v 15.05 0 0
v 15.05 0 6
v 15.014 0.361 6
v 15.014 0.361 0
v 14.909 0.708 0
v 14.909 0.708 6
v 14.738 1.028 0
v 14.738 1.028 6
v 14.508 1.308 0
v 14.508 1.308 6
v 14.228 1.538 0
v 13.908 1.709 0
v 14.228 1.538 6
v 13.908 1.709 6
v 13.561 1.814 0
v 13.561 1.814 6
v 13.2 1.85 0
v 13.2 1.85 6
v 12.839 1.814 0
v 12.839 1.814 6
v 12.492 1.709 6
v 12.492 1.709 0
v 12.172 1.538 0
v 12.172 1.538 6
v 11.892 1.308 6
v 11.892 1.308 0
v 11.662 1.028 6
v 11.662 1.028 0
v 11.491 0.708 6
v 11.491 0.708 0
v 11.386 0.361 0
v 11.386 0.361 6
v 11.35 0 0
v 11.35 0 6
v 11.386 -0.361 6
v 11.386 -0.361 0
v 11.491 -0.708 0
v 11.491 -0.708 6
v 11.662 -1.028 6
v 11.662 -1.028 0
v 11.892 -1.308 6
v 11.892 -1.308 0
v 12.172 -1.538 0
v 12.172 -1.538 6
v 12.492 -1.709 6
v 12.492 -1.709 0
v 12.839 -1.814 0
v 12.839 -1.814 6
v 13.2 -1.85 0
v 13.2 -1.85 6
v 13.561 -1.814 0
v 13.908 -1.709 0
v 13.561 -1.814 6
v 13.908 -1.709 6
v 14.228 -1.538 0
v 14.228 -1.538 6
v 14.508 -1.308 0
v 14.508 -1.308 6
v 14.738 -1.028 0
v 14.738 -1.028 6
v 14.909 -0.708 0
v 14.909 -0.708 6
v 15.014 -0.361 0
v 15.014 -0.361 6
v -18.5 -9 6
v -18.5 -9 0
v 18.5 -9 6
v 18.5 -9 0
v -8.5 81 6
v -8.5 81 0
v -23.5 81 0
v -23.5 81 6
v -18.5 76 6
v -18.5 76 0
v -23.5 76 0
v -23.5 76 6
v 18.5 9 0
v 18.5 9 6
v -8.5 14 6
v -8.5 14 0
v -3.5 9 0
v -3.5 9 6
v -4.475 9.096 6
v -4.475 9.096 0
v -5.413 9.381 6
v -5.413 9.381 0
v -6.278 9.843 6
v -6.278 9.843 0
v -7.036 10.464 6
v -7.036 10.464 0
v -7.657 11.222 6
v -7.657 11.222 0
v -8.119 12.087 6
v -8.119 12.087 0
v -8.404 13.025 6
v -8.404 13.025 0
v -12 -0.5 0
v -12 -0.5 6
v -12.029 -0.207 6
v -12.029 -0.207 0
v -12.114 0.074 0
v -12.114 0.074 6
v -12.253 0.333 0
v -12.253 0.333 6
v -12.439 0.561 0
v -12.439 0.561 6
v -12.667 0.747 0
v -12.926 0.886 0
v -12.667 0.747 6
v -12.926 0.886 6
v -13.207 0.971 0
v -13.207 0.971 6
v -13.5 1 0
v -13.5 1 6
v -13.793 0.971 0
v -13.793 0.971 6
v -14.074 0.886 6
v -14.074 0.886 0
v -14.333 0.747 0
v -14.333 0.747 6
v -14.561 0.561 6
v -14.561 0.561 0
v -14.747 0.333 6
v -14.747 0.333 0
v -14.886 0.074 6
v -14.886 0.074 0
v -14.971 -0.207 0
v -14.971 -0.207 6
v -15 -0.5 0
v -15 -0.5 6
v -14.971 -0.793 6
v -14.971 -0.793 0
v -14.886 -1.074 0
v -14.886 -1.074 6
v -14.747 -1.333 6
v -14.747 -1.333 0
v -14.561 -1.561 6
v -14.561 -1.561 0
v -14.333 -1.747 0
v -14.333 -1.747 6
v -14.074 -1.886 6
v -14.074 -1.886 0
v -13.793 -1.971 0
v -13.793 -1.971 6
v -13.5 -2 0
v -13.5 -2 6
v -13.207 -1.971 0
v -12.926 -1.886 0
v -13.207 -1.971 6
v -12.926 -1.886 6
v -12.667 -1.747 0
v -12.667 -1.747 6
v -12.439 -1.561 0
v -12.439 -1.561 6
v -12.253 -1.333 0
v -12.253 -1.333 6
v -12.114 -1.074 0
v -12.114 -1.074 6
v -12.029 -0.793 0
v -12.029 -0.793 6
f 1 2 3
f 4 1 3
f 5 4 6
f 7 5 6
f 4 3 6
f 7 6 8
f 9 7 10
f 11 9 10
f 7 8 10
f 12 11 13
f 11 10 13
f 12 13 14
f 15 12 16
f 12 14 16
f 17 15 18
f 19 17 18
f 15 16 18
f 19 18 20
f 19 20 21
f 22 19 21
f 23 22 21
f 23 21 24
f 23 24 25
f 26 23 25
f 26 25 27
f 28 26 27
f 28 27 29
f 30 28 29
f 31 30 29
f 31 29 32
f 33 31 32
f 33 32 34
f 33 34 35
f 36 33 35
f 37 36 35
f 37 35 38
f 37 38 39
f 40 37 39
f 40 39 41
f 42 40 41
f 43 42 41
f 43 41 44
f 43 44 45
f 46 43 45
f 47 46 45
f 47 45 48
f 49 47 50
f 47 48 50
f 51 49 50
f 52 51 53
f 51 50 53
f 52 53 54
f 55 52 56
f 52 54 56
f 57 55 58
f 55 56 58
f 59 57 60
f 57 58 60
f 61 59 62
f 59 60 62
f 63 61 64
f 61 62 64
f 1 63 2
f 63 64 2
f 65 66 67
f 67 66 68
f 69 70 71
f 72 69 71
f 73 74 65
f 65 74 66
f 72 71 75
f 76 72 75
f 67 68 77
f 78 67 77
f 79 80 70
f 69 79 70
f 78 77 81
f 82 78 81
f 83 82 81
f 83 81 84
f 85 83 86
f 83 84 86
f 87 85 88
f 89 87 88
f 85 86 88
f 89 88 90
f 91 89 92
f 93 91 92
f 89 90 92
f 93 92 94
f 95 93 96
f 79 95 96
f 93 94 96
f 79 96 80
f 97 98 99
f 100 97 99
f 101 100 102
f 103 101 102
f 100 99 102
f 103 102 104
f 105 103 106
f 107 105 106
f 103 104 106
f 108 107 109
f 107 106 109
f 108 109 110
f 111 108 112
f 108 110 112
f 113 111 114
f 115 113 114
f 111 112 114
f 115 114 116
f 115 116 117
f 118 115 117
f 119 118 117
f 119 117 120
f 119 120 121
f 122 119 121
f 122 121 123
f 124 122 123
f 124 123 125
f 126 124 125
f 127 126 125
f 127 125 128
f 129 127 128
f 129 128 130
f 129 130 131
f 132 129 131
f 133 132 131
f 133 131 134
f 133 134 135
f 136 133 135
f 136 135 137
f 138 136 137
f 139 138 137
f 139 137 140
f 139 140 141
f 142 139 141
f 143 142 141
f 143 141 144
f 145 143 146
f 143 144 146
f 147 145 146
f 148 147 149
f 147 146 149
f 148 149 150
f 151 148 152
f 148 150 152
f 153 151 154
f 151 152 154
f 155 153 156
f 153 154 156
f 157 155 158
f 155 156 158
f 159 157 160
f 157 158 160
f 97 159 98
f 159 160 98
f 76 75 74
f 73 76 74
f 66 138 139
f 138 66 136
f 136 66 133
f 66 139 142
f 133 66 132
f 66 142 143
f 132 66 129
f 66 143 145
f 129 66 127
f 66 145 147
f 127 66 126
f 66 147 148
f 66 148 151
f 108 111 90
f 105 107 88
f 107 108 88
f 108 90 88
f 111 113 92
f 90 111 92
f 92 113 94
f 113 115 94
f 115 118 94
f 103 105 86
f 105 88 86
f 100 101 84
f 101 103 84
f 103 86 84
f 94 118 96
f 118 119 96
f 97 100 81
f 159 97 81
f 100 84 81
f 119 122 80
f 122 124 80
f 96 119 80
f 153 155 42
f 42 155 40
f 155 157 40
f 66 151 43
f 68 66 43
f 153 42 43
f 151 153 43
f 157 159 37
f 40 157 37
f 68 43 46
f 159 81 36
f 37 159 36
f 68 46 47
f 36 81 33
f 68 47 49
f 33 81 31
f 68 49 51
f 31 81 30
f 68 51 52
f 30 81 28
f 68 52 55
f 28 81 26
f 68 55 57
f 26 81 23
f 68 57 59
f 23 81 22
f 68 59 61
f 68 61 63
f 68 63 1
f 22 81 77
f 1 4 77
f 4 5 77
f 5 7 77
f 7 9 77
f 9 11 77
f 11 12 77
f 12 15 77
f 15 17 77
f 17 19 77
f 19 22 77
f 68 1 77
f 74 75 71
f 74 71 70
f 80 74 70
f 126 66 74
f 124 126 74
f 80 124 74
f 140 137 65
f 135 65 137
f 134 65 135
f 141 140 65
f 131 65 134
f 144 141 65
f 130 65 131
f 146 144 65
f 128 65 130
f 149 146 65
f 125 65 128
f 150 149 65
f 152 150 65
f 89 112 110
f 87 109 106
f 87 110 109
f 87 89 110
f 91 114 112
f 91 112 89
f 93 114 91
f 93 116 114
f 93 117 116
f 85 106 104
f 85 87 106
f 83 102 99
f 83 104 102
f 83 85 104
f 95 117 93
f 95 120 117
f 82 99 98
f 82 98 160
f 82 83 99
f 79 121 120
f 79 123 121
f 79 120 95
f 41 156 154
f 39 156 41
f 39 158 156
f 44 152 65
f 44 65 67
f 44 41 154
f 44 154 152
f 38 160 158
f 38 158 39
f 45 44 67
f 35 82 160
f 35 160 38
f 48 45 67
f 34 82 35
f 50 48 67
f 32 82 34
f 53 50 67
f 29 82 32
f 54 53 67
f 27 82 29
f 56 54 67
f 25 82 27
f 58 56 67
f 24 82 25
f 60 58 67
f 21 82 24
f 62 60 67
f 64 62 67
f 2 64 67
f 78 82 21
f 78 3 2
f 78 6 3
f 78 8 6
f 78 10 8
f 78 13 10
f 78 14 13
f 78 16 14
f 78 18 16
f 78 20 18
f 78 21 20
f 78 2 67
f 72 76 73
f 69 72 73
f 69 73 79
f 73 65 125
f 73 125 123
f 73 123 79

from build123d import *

# Parameters (mm, degrees)
F1_DEPTH = 6
F2_R     = 1.5
F2_R_2   = 1.85
F3_DEPTH = 25


with BuildPart() as f1:
    # F0 (on Top) → F1 (new body)
    with BuildSketch(Plane.XY):
        with BuildLine():
            Line((-18.5, -9), (18.5, -9))
            Line((18.5, -9), (18.5, 9))
            Line((18.5, 9), (1.5, 9))
            Line((1.5, 9), (-3.5, 9))
            ThreePointArc((-3.5, 9), (-7.035534, 10.464466), (-8.5, 14))
            Line((-8.5, 14), (-8.5, 81))
            Line((-8.5, 81), (-18.5, 81))
            Line((-18.5, 81), (-23.5, 81))
            Line((-23.5, 81), (-23.5, 76))
            Line((-23.5, 76), (-18.5, 76))
            Line((-18.5, 76), (-18.5, 9))
            Line((-18.5, 9), (-18.5, -9))
        make_face()
    extrude(amount=F1_DEPTH)

    # F2 (on face) → F3 (cut)
    with BuildSketch(Plane.XY.offset(6)):
        with Locations((-13.5, -0.5)):
            Circle(F2_R)
        with Locations((13.2, 0)):
            Circle(F2_R_2)
    extrude(amount=-F3_DEPTH, mode=Mode.SUBTRACT)


solid = f1.part
